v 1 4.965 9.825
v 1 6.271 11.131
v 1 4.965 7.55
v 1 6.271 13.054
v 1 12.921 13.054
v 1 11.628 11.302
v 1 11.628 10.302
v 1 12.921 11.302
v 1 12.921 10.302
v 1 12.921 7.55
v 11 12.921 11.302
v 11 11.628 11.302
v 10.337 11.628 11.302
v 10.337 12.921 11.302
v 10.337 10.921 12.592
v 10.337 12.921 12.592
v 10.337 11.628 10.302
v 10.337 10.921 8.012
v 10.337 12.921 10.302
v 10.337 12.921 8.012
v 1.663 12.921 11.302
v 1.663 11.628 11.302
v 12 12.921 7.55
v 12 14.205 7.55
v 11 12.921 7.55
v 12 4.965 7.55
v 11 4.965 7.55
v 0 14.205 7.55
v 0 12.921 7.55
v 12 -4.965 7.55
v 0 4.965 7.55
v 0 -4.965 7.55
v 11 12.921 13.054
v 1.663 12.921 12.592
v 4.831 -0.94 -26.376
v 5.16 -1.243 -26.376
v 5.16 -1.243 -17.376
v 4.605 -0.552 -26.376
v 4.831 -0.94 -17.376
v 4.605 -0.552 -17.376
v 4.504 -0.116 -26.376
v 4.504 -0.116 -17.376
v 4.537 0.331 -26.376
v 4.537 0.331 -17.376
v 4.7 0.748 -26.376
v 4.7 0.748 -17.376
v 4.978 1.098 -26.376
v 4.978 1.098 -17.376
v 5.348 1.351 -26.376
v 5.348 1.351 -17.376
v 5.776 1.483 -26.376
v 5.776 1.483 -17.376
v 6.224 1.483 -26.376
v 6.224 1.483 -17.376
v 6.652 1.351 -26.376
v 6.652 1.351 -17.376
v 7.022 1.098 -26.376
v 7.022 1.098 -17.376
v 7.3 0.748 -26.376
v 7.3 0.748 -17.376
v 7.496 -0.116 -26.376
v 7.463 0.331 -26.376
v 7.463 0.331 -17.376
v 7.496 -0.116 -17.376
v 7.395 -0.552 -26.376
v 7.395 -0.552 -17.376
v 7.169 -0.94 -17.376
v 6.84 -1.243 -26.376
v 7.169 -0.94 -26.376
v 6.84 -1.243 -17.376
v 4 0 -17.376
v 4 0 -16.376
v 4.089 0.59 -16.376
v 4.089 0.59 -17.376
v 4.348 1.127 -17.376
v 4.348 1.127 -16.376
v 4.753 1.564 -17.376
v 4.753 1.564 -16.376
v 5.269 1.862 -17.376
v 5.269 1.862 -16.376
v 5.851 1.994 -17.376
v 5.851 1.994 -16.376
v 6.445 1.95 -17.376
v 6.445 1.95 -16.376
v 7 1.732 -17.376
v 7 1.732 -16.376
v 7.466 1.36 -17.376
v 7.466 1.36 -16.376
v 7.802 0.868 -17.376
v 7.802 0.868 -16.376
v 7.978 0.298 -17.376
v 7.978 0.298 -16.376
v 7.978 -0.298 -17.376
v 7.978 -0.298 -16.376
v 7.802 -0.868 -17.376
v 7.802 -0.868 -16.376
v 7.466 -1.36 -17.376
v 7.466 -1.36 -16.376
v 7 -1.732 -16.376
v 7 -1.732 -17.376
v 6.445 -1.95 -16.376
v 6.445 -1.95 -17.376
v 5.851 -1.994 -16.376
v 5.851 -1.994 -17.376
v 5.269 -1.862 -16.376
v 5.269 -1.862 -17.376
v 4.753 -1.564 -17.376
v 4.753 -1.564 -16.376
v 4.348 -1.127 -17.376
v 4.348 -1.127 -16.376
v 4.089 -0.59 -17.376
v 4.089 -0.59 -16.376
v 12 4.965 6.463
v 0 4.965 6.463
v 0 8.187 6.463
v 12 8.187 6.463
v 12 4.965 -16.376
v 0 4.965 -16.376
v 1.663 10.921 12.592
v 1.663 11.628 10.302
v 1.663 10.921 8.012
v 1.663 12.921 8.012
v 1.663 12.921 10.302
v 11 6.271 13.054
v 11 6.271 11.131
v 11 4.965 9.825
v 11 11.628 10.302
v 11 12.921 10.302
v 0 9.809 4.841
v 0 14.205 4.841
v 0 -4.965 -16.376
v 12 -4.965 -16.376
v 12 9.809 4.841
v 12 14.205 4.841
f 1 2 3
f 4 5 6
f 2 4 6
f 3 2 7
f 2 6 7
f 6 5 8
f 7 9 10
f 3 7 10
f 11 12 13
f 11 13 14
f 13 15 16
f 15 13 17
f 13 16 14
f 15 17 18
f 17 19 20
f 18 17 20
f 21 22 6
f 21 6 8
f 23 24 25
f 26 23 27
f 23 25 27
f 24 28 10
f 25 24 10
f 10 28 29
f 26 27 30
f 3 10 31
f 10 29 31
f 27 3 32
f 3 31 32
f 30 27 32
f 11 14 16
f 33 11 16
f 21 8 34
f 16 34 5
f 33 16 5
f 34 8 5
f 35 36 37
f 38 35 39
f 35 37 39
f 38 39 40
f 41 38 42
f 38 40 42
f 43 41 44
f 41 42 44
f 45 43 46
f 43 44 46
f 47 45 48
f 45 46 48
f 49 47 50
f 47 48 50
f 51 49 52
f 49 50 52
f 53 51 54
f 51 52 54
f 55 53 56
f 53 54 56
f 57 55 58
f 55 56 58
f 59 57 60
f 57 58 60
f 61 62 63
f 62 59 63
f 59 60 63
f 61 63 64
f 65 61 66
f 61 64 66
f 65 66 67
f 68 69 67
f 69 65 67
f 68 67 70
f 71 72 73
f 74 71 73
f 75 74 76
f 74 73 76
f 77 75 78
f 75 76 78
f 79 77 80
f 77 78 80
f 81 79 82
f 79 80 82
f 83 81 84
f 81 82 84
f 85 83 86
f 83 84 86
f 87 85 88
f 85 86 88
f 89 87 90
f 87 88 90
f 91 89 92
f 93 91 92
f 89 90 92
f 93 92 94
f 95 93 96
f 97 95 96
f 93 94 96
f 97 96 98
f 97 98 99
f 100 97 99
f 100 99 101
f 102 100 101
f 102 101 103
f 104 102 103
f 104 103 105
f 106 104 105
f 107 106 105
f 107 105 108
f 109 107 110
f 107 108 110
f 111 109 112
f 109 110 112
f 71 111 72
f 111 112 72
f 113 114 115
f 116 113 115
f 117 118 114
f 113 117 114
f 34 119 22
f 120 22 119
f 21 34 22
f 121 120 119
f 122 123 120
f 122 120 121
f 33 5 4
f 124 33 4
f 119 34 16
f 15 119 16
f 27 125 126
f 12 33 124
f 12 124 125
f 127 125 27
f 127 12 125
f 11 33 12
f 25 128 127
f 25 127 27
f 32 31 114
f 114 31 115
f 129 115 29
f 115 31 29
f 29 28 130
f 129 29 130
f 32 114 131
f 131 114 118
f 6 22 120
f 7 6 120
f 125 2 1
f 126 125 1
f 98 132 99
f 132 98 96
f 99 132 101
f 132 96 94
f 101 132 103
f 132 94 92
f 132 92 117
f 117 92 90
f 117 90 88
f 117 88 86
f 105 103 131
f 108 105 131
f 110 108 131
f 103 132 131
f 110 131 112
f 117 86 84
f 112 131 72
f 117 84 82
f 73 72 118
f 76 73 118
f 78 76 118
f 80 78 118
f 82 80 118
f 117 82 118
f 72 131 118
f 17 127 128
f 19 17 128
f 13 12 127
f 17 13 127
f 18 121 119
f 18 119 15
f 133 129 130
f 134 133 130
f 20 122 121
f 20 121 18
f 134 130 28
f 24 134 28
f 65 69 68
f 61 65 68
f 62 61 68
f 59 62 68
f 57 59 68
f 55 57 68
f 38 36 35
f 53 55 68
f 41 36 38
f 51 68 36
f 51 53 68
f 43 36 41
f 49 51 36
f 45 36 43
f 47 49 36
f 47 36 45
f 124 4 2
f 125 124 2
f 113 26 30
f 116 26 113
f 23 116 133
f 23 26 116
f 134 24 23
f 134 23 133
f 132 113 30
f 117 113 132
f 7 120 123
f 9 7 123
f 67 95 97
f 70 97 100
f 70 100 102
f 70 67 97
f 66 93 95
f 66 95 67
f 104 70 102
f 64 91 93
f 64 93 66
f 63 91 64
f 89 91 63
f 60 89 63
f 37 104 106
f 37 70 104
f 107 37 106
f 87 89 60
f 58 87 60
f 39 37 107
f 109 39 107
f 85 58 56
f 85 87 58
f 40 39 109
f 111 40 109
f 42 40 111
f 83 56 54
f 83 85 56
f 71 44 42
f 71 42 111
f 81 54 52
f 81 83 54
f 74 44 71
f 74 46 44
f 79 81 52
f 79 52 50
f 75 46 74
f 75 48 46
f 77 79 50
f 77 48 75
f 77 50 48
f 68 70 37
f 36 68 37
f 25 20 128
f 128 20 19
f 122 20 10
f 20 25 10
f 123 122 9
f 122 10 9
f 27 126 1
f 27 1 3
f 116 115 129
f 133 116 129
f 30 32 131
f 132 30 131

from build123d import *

# Parameters (mm, degrees)
BOSS_EXTRUDE2_DEPTH = 12
SKETCH2_R           = 2
BOSS_EXTRUDE3_DEPTH = 1
SKETCH3_R           = 1.5
BOSS_EXTRUDE4_DEPTH = 9
CUT_EXTRUDE1_START  = -9
CUT_EXTRUDE1_DEPTH  = 9
SKETCH5_W           = 1
SKETCH5_H           = 5.504032185
CUT_EXTRUDE2_DEPTH  = 35.052899636
SKETCH6_W           = 1
SKETCH6_H           = 1.293248053
CUT_EXTRUDE3_DEPTH  = 32.913534796
SKETCH7_W           = 8.674818334
SKETCH7_H           = 4.580598429
CUT_EXTRUDE4_DEPTH  = 2


with BuildPart() as part:
    # Sketch1 → Boss-Extrude2 (new body)
    with BuildSketch(Plane(origin=(0, 0, 0), x_dir=(0, 0, -1), z_dir=(1, 0, 0))):
        Polygon((7.575967815, 4.965), (-6.46289635, 4.965), (-6.46289635, 8.187263597), (-4.840898274, 9.809261674), (-4.840898274, 14.205), (-7.55, 14.205), (-7.55, 12.920980416), (-13.054032185, 12.920980416), (-13.054032185, 6.270822131), (-11.130968968, 6.270822131), (-9.825146836, 4.965), (-7.55, 4.965), (-7.55, -4.965), (7.55, -4.965), (16.375967815, -4.965), (16.375967815, 4.965), align=None)
    extrude(amount=BOSS_EXTRUDE2_DEPTH)

    # Sketch2 → Boss-Extrude3 (add)
    with BuildSketch(Plane(origin=(0, 0, -16.375967815), x_dir=(-1, 0, 0), z_dir=(0, 0, -1))):
        with Locations((-6, 0)):
            Circle(SKETCH2_R)
    extrude(amount=BOSS_EXTRUDE3_DEPTH)

    # Sketch3 → Boss-Extrude4 (add)
    with BuildSketch(Plane(origin=(0, 0, -17.375967815), x_dir=(-1, 0, 0), z_dir=(0, 0, -1))):
        with Locations((-6, 0)):
            Circle(SKETCH3_R)
    extrude(amount=BOSS_EXTRUDE4_DEPTH)

    # Sketch4 → Cut-Extrude1 (cut)
    with BuildSketch(Plane(origin=(0, 0, -26.375967815), x_dir=(-1, 0, 0), z_dir=(0, 0, -1)).offset(CUT_EXTRUDE1_START)):
        with BuildLine():
            Line((-6.839845518, -1.242843315), (-5.160154482, -1.242843315))
            ThreePointArc((-5.160154482, -1.242843315), (-6, -1.5), (-6.839845518, -1.242843315))
        make_face()
    extrude(amount=CUT_EXTRUDE1_DEPTH, mode=Mode.SUBTRACT)

    # Sketch5 → Cut-Extrude2 (cut, through all)
    with BuildSketch(Plane(origin=(0, 12.920980416, 0), x_dir=(1, 0, 0), z_dir=(0, 1, 0))):
        with Locations((11.5, -10.302016093)):
            Rectangle(SKETCH5_W, SKETCH5_H)
        with Locations((0.5, -10.302016093)):
            Rectangle(SKETCH5_W, SKETCH5_H)
    extrude(amount=-CUT_EXTRUDE2_DEPTH, mode=Mode.SUBTRACT)

    # Sketch6 → Cut-Extrude3 (cut, through all)
    with BuildSketch(Plane(origin=(11, 0, 0), x_dir=(0, 0, -1), z_dir=(1, 0, 0))):
        with Locations((-10.802016092, 12.27435639)):
            Rectangle(SKETCH6_W, SKETCH6_H)
    extrude(amount=-CUT_EXTRUDE3_DEPTH, mode=Mode.SUBTRACT)

    # Sketch7 → Cut-Extrude4 (cut)
    with BuildSketch(Plane(origin=(0, 12.920980416, 0), x_dir=(1, 0, 0), z_dir=(0, 1, 0))):
        with Locations((6, -10.302016093)):
            Rectangle(SKETCH7_W, SKETCH7_H)
    extrude(amount=-CUT_EXTRUDE4_DEPTH, mode=Mode.SUBTRACT)


solid = part.part
